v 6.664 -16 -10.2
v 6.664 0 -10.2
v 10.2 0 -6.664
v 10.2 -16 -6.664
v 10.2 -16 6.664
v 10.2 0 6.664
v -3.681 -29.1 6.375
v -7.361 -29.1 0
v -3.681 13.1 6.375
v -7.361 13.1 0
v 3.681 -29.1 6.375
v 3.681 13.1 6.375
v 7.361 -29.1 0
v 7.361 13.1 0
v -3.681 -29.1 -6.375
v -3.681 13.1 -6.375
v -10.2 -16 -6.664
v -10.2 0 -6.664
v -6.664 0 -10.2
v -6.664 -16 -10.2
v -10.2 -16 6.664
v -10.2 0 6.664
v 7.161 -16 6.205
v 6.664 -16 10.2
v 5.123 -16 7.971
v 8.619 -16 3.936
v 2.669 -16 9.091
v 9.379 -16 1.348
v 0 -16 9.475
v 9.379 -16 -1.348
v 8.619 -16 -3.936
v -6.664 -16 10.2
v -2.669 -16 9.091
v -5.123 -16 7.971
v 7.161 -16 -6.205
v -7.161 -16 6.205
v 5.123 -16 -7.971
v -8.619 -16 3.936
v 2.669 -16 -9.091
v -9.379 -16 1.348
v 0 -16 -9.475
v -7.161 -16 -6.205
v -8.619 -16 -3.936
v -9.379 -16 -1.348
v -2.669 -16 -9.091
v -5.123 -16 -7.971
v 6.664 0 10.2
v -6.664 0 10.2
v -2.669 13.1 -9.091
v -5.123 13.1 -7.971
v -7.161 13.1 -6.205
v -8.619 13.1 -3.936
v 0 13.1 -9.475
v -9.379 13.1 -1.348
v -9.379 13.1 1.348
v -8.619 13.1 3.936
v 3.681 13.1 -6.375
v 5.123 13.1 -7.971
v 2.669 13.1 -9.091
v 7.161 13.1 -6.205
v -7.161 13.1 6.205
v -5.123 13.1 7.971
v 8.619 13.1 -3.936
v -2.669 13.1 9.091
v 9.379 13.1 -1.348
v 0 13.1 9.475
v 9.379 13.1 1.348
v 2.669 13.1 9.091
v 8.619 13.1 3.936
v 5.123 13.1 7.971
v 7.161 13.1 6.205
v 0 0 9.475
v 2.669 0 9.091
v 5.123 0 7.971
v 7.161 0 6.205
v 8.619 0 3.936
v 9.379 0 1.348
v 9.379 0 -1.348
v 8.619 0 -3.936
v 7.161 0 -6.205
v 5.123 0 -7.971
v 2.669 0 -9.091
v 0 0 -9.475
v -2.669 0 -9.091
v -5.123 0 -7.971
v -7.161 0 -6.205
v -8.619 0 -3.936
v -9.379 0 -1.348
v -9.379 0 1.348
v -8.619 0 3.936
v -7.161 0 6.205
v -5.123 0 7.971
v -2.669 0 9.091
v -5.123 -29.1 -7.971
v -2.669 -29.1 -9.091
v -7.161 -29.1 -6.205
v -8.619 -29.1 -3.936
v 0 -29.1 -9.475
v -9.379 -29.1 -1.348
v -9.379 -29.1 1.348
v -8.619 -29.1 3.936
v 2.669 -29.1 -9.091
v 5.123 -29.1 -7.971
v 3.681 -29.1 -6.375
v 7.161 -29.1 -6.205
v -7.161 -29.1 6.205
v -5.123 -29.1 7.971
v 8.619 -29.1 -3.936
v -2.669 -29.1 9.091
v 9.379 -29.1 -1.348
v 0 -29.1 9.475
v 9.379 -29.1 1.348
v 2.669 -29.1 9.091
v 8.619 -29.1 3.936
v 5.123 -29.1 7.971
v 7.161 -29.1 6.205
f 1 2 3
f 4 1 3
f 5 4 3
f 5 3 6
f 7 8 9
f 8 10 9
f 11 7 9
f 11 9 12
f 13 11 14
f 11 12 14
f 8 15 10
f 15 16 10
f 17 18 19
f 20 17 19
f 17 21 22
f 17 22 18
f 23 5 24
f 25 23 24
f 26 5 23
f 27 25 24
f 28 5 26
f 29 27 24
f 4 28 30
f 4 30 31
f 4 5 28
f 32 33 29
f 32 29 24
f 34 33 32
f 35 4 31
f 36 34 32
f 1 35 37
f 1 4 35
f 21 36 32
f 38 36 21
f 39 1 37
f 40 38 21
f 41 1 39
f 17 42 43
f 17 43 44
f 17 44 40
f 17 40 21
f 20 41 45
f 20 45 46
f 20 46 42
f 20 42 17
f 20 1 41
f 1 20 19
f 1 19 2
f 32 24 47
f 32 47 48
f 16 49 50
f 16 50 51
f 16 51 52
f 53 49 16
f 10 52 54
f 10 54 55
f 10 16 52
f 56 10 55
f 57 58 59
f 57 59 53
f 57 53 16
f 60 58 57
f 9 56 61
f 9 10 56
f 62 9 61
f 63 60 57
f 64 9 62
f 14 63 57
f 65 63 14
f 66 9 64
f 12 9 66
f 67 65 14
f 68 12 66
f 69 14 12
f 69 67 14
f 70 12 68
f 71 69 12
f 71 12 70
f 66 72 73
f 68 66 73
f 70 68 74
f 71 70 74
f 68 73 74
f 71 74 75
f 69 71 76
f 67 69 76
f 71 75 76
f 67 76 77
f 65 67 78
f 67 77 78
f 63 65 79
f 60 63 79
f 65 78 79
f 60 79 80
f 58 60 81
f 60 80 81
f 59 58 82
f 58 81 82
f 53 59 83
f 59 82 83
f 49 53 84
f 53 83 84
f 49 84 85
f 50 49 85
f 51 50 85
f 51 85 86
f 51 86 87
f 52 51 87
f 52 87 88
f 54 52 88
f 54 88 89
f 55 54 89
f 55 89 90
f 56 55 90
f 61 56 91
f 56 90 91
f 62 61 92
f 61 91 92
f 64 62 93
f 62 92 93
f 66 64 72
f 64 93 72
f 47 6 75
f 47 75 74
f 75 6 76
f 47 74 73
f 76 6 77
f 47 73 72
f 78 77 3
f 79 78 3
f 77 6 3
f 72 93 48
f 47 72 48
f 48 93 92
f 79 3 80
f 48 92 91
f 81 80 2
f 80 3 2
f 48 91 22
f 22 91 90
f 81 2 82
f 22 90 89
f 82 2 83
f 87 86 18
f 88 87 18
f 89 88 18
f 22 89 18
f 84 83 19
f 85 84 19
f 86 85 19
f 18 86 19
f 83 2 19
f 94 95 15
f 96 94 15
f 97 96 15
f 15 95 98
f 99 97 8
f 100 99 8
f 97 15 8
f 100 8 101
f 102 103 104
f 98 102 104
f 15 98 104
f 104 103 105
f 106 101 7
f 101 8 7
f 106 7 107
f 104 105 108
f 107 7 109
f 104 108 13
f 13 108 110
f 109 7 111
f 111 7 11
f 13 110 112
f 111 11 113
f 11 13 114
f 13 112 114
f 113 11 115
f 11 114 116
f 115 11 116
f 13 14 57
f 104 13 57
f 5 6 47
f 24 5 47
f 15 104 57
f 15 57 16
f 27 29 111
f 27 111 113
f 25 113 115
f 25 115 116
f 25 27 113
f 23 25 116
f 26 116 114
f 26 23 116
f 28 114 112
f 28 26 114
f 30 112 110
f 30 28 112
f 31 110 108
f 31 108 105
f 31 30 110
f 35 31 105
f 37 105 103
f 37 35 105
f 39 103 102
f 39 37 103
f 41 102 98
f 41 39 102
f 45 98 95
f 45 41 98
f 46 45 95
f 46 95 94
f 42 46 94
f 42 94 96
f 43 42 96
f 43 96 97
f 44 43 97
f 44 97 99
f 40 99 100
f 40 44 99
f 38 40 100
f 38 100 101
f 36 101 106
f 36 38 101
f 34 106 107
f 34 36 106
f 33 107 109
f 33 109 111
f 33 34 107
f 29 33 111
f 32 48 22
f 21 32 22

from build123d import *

# Parameters (mm, degrees)
SKETCH1_R           = 9.475
BOSS_EXTRUDE1_DEPTH = 13.1
BOSS_EXTRUDE3_DEPTH = 16


with BuildPart() as part:
    # Sketch1 → Boss-Extrude1 (new body)
    with BuildSketch(Plane(origin=(0, 0, 0), x_dir=(1, 0, 0), z_dir=(0, 1, 0))):
        with Locations(Location((0, 0, 0), (0, 0, 270))):
            Circle(SKETCH1_R)
        Polygon((7.361215932, 0), (3.680607966, 6.375), (-3.680607966, 6.375), (-7.361215932, 0), (-3.680607966, -6.375), (3.680607966, -6.375), align=None, mode=Mode.SUBTRACT)
    boss_extrude1 = extrude(amount=BOSS_EXTRUDE1_DEPTH)

    # Sketch2 → Boss-Extrude3 (add)
    with BuildSketch(Plane(origin=(0, 0, 0), x_dir=(1, 0, 0), z_dir=(0, 1, 0))):
        Polygon((-10.2, 6.664466094), (-6.664466094, 10.2), (6.664466094, 10.2), (10.2, 6.664466094), (10.2, -6.664466094), (6.664466094, -10.2), (-6.664466094, -10.2), (-10.2, -6.664466094), align=None)
        Polygon((3.680607966, 6.375), (-3.680607966, 6.375), (-7.361215932, 0), (-3.680607966, -6.375), (3.680607966, -6.375), (7.361215932, 0), align=None, mode=Mode.SUBTRACT)
    extrude(amount=-BOSS_EXTRUDE3_DEPTH)

    # Mirror1: Boss-Extrude1 across plane
    add(boss_extrude1.mirror(Plane.ZX.offset(-8)))


solid = part.part
